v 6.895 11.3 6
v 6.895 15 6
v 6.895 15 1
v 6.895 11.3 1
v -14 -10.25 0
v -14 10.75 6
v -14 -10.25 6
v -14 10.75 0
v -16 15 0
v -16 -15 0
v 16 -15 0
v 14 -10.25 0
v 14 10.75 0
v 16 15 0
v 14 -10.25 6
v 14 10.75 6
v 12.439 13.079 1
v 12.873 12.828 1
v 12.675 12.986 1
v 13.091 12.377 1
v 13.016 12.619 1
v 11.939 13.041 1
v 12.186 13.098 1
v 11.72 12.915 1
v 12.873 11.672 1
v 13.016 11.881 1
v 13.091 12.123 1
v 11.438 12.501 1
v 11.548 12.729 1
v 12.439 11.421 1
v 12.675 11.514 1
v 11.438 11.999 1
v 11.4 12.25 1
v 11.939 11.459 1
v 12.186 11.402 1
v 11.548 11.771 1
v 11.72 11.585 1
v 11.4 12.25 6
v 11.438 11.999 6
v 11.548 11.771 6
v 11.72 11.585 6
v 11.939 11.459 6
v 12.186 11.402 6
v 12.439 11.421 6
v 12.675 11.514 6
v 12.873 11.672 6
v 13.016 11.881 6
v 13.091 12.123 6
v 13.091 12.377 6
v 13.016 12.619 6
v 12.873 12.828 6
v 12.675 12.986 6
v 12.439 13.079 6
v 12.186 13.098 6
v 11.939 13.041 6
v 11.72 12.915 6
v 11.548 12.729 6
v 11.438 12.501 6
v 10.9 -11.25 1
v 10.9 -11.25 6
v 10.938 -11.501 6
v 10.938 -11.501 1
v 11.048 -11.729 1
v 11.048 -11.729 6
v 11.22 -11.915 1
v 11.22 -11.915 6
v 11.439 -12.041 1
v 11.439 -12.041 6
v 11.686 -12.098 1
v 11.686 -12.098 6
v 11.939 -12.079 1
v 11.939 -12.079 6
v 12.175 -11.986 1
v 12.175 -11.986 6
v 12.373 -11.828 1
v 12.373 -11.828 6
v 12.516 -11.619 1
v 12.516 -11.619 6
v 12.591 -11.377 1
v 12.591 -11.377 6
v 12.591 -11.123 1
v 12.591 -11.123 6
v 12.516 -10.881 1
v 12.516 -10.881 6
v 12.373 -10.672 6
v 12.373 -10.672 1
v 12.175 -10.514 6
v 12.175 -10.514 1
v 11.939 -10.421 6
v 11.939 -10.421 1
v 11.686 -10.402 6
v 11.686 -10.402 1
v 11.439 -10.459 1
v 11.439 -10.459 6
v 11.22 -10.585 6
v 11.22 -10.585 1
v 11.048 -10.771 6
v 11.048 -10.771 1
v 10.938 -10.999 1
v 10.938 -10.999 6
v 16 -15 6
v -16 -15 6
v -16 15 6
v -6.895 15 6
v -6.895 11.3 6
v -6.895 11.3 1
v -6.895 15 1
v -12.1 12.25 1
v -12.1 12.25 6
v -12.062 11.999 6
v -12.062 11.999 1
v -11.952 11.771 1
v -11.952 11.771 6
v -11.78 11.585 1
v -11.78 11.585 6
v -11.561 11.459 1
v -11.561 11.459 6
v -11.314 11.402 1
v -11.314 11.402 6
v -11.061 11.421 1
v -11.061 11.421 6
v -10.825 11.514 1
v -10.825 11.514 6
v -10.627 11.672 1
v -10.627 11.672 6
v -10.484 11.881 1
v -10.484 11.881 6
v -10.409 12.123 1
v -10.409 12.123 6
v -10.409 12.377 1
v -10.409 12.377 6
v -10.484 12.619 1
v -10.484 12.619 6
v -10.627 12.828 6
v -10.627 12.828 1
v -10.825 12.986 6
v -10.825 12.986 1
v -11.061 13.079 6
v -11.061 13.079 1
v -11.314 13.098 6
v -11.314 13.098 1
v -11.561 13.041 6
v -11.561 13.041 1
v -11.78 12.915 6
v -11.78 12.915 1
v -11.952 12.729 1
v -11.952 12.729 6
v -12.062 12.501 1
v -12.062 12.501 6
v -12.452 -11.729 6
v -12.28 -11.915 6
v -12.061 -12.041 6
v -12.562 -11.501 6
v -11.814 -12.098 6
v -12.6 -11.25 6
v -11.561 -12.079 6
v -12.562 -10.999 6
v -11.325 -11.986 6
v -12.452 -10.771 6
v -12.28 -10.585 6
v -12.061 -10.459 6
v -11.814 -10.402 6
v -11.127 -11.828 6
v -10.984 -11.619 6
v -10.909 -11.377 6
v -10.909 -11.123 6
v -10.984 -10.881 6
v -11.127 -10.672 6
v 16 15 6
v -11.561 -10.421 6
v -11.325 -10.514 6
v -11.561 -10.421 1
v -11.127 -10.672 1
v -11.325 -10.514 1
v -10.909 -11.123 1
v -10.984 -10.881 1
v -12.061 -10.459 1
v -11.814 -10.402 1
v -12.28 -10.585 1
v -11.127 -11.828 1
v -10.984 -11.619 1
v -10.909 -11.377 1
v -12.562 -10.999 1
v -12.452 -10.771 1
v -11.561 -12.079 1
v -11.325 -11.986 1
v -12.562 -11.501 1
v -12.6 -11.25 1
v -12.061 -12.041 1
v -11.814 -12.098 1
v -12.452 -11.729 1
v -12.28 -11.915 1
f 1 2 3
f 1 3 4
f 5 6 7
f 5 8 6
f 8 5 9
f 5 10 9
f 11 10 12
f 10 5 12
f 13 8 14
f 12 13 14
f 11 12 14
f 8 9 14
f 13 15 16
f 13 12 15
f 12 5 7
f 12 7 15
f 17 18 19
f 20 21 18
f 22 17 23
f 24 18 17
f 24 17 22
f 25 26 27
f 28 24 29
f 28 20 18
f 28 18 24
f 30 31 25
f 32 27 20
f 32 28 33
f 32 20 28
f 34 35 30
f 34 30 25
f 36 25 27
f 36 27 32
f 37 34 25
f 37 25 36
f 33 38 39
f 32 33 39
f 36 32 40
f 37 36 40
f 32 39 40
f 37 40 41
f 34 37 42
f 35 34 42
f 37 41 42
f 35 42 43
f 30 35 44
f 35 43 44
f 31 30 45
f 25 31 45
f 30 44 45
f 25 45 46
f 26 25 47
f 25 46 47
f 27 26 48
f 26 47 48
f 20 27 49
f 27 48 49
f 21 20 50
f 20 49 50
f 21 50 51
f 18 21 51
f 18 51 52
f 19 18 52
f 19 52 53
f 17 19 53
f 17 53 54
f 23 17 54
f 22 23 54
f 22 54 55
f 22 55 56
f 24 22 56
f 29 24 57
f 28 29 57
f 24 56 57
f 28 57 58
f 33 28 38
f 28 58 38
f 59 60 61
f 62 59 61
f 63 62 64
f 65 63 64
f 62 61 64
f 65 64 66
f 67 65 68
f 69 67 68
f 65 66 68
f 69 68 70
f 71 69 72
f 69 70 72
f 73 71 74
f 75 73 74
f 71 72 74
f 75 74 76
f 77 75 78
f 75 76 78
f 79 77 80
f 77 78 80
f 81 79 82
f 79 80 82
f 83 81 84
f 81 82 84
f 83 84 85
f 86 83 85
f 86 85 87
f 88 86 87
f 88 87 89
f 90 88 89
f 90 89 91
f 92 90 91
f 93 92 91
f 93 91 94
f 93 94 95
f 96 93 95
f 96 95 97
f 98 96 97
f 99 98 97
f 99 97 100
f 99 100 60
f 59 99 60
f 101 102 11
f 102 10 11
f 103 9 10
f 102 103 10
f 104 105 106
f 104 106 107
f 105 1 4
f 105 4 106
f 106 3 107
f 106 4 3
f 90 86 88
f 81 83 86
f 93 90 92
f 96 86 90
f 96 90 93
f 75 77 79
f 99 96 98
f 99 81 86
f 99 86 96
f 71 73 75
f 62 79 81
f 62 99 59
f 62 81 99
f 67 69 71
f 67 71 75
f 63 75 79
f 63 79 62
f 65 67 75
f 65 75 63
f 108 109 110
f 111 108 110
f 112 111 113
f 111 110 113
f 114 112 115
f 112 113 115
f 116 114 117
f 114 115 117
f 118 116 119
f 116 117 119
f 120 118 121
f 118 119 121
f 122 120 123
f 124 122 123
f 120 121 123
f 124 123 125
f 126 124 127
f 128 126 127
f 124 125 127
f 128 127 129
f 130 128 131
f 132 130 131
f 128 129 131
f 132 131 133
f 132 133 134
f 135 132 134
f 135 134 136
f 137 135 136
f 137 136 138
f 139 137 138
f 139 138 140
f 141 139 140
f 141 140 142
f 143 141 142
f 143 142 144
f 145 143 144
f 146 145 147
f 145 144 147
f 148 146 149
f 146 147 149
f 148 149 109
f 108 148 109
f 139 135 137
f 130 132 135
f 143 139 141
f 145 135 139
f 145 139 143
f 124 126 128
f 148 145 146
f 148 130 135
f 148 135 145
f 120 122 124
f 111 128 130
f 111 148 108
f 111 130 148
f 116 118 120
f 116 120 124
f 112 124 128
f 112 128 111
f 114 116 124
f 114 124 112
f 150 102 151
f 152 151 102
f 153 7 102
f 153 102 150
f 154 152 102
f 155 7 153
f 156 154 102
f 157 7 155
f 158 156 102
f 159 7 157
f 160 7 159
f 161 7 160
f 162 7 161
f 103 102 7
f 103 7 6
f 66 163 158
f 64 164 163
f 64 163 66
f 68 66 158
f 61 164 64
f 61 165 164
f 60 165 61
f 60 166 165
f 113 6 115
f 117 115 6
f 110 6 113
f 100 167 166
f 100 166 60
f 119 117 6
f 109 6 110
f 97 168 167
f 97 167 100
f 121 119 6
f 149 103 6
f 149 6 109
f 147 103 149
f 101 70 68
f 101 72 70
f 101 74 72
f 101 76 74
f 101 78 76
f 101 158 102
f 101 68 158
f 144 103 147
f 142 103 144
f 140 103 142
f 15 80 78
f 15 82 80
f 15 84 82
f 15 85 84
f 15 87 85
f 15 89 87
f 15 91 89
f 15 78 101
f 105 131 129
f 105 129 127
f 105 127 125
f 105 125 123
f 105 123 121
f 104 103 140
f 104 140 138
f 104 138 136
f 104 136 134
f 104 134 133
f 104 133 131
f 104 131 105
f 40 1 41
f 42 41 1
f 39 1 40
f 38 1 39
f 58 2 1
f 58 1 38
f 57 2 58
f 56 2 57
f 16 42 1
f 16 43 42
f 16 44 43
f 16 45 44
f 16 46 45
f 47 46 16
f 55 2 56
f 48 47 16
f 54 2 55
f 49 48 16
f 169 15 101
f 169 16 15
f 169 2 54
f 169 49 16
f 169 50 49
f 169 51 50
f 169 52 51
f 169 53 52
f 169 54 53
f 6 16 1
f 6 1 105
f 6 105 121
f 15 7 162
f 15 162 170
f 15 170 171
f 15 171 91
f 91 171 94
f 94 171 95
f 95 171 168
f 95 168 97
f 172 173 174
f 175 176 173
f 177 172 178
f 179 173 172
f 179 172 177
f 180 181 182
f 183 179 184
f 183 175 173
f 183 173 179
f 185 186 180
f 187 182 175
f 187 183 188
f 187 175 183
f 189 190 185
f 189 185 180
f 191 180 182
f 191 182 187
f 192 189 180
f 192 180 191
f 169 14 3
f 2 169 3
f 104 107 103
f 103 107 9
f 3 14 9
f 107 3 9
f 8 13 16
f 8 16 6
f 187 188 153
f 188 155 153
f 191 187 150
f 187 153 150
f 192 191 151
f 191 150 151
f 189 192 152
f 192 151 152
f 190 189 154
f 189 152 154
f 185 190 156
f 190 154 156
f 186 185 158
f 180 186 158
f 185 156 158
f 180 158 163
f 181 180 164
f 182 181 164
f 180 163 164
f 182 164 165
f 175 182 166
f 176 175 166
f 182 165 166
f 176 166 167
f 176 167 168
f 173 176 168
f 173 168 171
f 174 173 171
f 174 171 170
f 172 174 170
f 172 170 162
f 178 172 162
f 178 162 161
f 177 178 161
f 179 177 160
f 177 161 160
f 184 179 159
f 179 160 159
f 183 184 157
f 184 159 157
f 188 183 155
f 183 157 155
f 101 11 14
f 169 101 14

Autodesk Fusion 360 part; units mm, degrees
sketch "Sketch1" plane through (0, 0, 0) normal (0, 0, 1) x (1, 0, 0)
  line L0 (16, 15) -> (-16, 15)
  line L1 (-16, 15) -> (-16, -15)
  line L2 (-16, -15) -> (16, -15)
  line L3 (16, -15) -> (16, 15)
  line L4 (-16, 15) -> (16, -15) construction
  line L5 (14, 10.25) -> (-14, -10.25) construction
  line L6 (-14.6684, 10.7394) -> (14, -10.25) construction
  line L7 (14, -10.25) -> (14, 10.75)
  line L8 (14, 10.75) -> (-14, 10.75)
  line L9 (-14, 10.75) -> (-14, -10.25)
  line L10 (-14, -10.25) -> (14, -10.25)
  dimension "d1" = 32
  dimension "d2" = 30
  dimension "d3" = 28
  dimension "d4" = 21
  dimension "d33" = 28
  dimension "d34" = 21
extrude "Extrude1" add sketch "Sketch1" along normal blind 6 contours L0 L1 L2 L3 | L7 L8 L9 L10
sketch "Sketch2" plane through (0, 0, 6) normal (0, 0, 1) x (-1, 0, 0)
  line L0 (-16, 15) -> (-16, -15)
  line L1 (-16, -15) -> (16, -15)
  line L2 (16, -15) -> (16, 15)
  line L3 (16, 15) -> (-16, 15)
  line L4 (6.895, -15) -> (-6.895, -15)
  line L5 (-6.895, -15) -> (-6.895, -11.3)
  line L6 (-6.895, -11.3) -> (6.895, -11.3)
  line L7 (6.895, -11.3) -> (6.895, -15)
  dimension "d7" = 13.79
  dimension "d8" = 3.7
extrude "Extrude2" cut sketch "Sketch2" against normal blind 5 contours L1 L4 L5 L6 L7
sketch "Sketch3" plane through (0, 0, 6) normal (0, 0, 1) x (-1, 0, 0)
  line L0 (6.895, -11.3) -> (6.895, -15)
  line L1 (6.895, -15) -> (16, -15)
  line L2 (16, -15) -> (16, 15)
  line L3 (16, 15) -> (-16, 15)
  line L4 (-16, 15) -> (-16, -15)
  line L5 (-16, -15) -> (-6.895, -15)
  line L6 (-6.895, -15) -> (-6.895, -11.3)
  line L7 (-6.895, -11.3) -> (6.895, -11.3)
  line L8 (-13.75, -13.75) -> (13.75, -13.75)
  line L9 (13.75, -13.75) -> (13.75, 13.75)
  line L10 (13.75, 13.75) -> (-13.75, 13.75)
  line L11 (-13.75, 13.75) -> (-13.75, -13.75)
  line L12 (-13.75, -13.75) -> (13.75, 13.75) construction
  line L13 (13.75, -13.75) -> (-13.75, 13.75) construction
  line L14 (-13.75, -13.75) -> (-12.25, -13.75)
  line L15 (-13.75, -12.25) -> (-13.75, -13.75)
  circle A0 centre (-12.25, -12.25) radius 0.85
  line L16 (13.75, -13.75) -> (11.25, -13.75)
  line L17 (13.75, -12.25) -> (13.75, -13.75)
  circle A1 centre (11.25, -12.25) radius 0.85
  line L18 (13.75, 13.75) -> (11.25, 13.75)
  line L19 (13.75, 11.25) -> (13.75, 13.75)
  circle A2 centre (11.75, 11.25) radius 0.85
  line L20 (-13.75, 13.75) -> (-12.25, 13.75)
  line L21 (-13.75, 12.25) -> (-13.75, 13.75)
  circle A3 centre (-11.75, 11.25) radius 0.85
  line L22 (8.2149, 11.25) -> (8.2149, 11.2573)
  line L23 (-13.75, 13.75) -> (-11.25, 13.75)
  line L24 (-13.75, 11.25) -> (-13.75, 13.75)
  line L25 (-13.75, -13.75) -> (-12.25, -13.75)
  line L26 (-13.75, -11.25) -> (-13.75, -13.75)
  line L27 (13.75, -13.75) -> (11.25, -13.75)
  line L28 (13.75, -11.25) -> (13.75, -13.75)
  line L29 (11.25, -12.25) -> (-12.25, -12.25)
  line L30 (-11.75, 11.25) -> (11.75, 11.25)
  dimension "d11" = 27.5
  dimension "d12" = 27.5
  dimension "d15" = 1.7
  dimension "d18" = 1.7
  dimension "d19" = 2.5
  dimension "d20" = 2.5
  dimension "d21" = 1.7
  dimension "d22" = 1.5
  dimension "d23" = 1.5
  dimension "d24" = 1.7
  dimension "d27" = 2.5
  dimension "d28" = 2.5
  dimension "d30" = 2.5
  dimension "d31" = 2.5
  dimension "d32" = 2.5
  dimension "d37" = 23.5
  dimension "d38" = 23.5
extrude "Extrude3" cut sketch "Sketch3" against normal blind 5 contours A1 | A0 | A2 | A3
extrude "Extrude4" cut sketch "Sketch1" along normal blind 6 contours L7 L8 L9 L10
